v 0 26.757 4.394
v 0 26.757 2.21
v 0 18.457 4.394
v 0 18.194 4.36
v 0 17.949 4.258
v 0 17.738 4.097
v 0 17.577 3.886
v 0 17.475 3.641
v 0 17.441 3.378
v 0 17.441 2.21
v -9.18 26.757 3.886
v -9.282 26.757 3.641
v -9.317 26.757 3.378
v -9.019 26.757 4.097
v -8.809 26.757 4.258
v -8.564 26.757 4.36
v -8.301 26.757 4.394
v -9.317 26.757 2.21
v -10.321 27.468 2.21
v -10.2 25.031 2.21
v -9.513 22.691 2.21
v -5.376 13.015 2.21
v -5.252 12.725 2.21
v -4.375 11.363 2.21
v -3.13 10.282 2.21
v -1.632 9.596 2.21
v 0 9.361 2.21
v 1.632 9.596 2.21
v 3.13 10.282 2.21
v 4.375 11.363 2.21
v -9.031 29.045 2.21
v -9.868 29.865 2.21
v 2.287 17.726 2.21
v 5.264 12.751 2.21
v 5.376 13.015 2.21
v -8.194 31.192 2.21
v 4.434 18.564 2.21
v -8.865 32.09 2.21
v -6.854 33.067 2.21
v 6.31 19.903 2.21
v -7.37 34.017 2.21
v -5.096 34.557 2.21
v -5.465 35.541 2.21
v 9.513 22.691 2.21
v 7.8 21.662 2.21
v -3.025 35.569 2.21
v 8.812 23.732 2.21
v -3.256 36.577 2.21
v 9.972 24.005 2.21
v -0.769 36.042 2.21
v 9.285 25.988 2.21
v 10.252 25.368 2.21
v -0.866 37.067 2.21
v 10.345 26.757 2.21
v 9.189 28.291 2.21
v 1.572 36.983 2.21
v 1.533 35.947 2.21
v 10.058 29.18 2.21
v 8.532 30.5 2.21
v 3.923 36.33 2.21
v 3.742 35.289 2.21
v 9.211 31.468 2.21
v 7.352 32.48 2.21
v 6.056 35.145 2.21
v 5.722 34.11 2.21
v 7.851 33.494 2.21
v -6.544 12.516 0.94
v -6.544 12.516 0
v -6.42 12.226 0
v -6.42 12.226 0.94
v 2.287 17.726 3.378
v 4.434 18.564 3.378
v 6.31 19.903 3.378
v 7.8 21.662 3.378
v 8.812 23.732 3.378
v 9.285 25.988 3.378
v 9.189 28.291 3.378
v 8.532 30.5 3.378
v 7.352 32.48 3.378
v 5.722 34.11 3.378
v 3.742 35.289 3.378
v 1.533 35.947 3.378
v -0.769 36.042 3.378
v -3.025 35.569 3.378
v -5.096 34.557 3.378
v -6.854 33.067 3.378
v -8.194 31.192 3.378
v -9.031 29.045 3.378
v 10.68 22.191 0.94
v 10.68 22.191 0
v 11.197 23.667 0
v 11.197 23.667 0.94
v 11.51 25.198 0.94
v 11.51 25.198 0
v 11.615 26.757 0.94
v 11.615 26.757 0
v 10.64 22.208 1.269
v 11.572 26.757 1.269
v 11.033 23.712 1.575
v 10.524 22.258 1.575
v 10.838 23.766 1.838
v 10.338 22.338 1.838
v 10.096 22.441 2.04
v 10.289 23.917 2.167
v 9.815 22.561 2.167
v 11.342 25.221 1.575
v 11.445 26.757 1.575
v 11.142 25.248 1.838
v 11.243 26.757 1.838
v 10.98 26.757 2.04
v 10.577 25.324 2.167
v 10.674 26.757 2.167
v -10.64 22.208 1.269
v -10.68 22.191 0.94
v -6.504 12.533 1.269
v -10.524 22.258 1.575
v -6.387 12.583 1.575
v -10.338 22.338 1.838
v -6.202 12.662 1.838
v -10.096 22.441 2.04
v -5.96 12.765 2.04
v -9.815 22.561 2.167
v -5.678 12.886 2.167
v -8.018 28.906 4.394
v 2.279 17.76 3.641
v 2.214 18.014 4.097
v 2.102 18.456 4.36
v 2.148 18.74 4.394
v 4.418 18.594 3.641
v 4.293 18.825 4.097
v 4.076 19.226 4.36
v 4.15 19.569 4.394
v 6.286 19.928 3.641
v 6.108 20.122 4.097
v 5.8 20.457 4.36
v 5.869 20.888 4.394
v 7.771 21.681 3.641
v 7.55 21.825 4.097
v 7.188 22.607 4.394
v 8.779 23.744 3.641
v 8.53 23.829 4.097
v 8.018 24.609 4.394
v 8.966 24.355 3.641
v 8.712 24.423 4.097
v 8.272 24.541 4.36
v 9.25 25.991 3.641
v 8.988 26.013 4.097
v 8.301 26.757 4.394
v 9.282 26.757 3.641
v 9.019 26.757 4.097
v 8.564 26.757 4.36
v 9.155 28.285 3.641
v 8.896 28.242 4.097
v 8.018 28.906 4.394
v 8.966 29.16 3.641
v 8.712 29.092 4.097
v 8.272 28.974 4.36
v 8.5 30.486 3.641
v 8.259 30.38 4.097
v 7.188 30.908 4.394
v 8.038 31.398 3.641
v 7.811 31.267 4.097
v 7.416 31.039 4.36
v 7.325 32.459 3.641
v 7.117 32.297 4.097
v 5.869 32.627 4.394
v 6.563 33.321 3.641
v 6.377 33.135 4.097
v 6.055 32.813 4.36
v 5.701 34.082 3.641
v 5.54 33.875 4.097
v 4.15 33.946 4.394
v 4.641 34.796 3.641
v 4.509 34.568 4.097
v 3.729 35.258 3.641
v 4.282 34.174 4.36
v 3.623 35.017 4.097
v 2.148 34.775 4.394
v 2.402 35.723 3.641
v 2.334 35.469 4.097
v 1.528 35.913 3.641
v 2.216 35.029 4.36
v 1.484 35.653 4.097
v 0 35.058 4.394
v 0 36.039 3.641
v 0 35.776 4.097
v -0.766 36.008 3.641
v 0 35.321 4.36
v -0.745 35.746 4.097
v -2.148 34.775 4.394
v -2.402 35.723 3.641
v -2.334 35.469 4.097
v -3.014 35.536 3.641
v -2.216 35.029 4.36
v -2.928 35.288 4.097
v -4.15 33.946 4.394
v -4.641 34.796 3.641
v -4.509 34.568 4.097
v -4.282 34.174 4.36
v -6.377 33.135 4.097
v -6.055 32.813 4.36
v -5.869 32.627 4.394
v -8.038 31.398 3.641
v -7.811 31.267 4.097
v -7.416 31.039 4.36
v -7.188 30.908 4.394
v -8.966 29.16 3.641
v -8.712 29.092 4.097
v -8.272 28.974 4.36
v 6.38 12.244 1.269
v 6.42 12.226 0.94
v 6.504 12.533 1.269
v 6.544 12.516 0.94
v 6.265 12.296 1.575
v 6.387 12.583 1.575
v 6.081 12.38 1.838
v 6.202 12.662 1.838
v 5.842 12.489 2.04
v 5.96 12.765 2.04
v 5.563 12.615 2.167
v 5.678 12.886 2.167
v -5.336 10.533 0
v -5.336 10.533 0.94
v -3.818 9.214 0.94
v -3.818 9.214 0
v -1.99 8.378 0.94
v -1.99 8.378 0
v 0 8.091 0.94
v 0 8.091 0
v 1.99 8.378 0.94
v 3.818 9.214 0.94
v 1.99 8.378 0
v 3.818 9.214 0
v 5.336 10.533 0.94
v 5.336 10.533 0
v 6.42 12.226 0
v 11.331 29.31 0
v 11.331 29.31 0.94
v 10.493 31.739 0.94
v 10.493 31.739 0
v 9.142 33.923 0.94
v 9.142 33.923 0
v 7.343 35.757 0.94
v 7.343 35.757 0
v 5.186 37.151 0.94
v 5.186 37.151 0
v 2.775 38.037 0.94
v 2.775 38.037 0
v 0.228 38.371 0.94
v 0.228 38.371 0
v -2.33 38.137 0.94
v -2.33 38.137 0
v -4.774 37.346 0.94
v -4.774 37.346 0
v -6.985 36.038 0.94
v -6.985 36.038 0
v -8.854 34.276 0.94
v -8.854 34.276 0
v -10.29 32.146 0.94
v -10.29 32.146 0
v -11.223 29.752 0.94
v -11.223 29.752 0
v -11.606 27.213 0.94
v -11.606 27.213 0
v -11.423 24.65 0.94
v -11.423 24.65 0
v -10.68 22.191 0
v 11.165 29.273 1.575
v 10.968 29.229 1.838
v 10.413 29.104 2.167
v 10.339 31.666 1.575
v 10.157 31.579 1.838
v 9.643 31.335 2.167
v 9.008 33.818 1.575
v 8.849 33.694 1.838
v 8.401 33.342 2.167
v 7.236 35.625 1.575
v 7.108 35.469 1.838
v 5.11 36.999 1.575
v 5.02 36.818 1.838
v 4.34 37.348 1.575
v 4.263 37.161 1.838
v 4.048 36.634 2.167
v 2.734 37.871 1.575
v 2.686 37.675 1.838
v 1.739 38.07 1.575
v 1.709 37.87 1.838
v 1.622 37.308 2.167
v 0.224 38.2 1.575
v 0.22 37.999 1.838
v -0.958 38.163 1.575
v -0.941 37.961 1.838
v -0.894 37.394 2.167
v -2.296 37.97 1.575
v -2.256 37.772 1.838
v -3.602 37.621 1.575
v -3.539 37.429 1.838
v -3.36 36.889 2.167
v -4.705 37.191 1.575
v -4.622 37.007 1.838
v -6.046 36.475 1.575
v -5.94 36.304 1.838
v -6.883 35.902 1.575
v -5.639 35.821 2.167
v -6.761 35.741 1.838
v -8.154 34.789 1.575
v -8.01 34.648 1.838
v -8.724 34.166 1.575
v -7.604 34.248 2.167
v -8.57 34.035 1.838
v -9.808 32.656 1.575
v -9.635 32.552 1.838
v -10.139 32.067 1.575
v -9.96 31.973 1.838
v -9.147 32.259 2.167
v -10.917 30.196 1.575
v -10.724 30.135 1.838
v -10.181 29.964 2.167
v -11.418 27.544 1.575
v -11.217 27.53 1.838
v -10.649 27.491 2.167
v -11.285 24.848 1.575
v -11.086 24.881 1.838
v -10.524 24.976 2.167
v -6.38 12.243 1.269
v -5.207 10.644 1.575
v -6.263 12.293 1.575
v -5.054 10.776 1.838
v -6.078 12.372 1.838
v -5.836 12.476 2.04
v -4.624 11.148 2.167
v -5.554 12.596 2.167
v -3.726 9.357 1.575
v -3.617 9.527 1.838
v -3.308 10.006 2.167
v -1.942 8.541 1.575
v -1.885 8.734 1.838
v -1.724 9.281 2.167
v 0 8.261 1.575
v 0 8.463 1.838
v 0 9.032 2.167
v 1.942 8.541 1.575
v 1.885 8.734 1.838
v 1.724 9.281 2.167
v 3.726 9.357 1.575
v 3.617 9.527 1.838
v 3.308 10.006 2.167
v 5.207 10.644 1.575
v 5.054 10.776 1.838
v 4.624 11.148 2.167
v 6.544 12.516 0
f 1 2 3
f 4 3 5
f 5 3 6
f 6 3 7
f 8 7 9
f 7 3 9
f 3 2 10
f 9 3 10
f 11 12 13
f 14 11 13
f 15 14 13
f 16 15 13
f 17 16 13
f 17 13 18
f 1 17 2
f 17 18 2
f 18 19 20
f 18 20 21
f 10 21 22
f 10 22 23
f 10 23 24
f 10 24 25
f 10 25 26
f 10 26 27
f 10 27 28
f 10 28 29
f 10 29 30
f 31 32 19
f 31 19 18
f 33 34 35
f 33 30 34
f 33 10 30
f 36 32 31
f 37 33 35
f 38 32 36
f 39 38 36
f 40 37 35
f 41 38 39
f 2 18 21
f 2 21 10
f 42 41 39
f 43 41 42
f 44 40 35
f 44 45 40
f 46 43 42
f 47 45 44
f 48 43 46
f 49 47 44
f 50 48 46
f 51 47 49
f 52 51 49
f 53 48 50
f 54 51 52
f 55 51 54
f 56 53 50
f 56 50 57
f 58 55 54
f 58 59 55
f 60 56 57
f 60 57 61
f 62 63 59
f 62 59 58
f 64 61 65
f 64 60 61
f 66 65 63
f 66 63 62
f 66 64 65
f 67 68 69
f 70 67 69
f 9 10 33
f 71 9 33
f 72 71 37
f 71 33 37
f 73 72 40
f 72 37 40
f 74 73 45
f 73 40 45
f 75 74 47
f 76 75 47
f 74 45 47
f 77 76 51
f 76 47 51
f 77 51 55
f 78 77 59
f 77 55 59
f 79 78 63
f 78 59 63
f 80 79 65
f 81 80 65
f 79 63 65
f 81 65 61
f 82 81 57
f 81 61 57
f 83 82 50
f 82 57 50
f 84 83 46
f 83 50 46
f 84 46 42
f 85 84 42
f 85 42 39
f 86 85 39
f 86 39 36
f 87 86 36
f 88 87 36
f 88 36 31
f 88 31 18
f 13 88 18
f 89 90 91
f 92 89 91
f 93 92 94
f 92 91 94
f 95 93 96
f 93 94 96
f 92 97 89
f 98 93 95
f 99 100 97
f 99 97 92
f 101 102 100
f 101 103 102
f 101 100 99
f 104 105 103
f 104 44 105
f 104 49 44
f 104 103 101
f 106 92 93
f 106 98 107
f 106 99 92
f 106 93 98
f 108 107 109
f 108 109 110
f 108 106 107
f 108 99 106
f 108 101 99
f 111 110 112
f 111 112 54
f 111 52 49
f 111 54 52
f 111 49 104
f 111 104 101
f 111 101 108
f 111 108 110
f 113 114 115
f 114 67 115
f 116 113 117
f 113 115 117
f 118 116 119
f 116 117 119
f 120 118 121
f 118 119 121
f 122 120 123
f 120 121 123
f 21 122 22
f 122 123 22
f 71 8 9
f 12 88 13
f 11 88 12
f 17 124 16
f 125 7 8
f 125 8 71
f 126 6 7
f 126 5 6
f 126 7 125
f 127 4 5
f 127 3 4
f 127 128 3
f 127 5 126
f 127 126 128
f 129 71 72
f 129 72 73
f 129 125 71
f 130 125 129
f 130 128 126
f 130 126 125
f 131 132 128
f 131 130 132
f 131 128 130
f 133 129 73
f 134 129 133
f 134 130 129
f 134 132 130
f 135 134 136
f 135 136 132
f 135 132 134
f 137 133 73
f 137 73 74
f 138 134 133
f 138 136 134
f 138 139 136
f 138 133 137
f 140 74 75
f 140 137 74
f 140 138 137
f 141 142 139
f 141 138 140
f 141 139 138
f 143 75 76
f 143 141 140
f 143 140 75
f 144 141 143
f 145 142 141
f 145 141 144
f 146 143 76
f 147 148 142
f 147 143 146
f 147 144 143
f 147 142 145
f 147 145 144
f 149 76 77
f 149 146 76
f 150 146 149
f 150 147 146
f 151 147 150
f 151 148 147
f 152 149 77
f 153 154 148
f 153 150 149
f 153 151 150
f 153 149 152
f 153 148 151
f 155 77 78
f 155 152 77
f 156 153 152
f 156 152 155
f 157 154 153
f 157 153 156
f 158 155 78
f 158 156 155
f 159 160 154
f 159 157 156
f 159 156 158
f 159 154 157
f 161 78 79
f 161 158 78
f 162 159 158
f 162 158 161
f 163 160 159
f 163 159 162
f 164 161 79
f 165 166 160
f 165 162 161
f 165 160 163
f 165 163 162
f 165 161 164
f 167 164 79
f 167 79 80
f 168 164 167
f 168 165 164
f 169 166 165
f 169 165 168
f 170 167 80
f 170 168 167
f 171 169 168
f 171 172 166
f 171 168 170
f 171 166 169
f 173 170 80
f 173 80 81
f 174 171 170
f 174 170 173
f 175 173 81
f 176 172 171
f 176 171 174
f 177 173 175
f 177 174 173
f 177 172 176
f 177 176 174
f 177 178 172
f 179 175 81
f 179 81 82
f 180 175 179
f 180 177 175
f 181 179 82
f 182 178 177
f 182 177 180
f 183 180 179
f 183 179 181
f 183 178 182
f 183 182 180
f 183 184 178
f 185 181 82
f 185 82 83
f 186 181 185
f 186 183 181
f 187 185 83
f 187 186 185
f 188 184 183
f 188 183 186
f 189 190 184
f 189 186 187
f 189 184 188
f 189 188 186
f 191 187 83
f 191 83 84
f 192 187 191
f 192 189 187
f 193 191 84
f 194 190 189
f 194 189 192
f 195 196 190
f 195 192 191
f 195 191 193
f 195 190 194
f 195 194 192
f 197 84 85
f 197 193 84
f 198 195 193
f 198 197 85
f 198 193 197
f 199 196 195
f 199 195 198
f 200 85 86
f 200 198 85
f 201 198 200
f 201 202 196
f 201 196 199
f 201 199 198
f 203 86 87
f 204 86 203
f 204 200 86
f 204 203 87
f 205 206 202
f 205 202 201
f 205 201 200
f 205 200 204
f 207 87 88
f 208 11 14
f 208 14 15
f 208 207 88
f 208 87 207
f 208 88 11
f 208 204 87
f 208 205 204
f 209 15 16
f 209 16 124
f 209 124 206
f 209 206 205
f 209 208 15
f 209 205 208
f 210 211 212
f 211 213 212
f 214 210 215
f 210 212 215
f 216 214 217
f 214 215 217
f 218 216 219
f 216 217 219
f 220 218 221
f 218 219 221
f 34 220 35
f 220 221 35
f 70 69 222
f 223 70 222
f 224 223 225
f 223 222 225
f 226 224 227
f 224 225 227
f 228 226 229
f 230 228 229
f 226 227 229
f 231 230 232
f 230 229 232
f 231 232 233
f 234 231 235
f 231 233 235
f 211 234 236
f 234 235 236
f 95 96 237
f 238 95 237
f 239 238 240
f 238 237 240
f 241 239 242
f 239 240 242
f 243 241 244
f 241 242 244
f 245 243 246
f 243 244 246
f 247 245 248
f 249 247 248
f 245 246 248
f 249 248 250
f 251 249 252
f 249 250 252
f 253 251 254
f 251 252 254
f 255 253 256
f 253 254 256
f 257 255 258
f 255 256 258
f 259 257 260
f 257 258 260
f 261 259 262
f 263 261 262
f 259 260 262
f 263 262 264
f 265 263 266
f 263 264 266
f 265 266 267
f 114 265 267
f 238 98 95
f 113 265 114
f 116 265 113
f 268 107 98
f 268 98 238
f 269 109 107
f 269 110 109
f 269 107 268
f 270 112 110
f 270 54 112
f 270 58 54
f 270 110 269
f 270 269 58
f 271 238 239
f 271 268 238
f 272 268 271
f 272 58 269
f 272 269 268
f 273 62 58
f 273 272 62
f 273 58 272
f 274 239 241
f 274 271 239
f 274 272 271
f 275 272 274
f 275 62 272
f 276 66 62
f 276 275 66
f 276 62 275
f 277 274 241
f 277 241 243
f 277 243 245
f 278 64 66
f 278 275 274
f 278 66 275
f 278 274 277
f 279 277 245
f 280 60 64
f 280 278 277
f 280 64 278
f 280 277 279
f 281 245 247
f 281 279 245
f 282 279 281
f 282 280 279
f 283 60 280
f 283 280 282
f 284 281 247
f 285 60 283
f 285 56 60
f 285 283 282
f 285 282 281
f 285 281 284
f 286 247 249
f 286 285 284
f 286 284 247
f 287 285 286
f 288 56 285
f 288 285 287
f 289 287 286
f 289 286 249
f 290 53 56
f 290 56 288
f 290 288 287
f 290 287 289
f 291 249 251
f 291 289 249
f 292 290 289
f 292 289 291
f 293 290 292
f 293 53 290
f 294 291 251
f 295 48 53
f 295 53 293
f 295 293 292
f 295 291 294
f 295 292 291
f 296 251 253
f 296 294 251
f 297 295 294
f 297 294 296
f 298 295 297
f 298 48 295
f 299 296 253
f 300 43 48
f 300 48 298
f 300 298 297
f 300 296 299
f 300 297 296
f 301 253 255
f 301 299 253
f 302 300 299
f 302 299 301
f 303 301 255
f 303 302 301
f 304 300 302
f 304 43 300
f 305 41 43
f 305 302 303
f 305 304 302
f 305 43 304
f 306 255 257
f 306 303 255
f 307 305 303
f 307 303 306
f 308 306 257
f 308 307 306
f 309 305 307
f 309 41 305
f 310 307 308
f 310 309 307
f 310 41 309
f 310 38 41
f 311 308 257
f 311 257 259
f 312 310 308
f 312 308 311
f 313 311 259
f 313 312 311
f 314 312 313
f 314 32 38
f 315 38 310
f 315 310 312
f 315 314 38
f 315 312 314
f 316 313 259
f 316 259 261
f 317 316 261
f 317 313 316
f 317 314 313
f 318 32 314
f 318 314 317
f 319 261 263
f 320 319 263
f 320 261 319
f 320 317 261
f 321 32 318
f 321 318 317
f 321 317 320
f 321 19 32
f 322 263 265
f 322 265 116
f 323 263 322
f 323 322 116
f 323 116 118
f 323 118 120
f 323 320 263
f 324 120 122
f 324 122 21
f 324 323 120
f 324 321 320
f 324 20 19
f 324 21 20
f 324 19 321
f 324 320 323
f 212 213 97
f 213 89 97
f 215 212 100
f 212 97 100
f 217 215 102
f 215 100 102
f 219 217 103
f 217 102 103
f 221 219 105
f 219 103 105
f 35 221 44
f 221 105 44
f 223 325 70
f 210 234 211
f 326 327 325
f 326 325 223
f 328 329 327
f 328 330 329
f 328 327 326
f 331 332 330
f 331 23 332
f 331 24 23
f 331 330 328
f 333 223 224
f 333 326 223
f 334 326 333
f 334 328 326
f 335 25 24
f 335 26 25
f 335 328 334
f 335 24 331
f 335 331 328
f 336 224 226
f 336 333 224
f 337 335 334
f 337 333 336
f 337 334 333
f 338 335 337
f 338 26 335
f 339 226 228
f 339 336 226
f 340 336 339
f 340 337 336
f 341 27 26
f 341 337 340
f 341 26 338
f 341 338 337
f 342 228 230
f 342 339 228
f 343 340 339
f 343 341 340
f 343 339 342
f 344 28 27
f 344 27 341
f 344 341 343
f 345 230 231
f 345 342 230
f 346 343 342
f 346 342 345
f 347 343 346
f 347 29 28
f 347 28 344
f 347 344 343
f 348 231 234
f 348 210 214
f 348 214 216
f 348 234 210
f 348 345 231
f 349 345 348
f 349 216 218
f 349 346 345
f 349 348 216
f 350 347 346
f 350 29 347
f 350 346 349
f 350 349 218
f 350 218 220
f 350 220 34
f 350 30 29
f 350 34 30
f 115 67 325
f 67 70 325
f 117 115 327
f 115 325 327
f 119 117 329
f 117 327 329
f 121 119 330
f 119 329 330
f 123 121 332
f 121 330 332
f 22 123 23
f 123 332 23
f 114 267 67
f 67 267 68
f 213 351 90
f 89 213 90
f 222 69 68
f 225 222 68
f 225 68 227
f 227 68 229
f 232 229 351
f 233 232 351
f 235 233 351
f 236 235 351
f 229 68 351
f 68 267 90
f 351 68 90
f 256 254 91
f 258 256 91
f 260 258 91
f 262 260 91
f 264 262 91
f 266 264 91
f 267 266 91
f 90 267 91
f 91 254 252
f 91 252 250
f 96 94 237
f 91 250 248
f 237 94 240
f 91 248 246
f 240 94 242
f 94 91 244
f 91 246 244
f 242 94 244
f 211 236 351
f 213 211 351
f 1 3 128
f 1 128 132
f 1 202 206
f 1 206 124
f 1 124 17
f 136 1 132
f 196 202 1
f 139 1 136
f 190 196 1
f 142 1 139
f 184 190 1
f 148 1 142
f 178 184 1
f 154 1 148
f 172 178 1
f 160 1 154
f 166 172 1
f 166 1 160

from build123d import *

# Parameters (mm, degrees)
F1_DEPTH = 2.2098
F2_R     = 1.27
F4_DEPTH = 2.1844
F5_R     = 1.016


with BuildPart() as f1:
    # F0 (on Top) → F1 (new body)
    with BuildSketch(Plane.XY):
        with BuildLine():
            ThreePointArc((10.680274663, 22.1913547378), (11.3792147126, 24.4270132399), (11.6153963278, 26.7574433237))
            ThreePointArc((11.6153963278, 26.7574433237), (-2.3304300838, 38.1366580363), (-10.680274663, 22.1913547378))
            ThreePointArc((-10.680274663, 22.1913547378), (-9.0390071452, 19.4626656245), (-6.7184275333, 17.282203837))
            ThreePointArc((-6.7184275333, 17.282203837), (0, 22.1931135695), (6.7184275333, 17.282203837))
            ThreePointArc((6.7184275333, 17.282203837), (9.0390071452, 19.4626656245), (10.680274663, 22.1913547378))
        make_face()
        with BuildLine():
            ThreePointArc((6.7184275333, 17.282203837), (0, 22.1931135695), (-6.7184275333, 17.282203837))
            ThreePointArc((-6.7184275333, 17.282203837), (0, 15.142046996), (6.7184275333, 17.282203837))
        make_face()
        with BuildLine():
            ThreePointArc((6.7184275333, 17.282203837), (0, 15.142046996), (-6.7184275333, 17.282203837))
            ThreePointArc((-6.7184275333, 17.282203837), (-7.0463335637, 14.8837387803), (-6.5436952619, 12.5157202562))
            Line((-6.5436952619, 12.5157202562), (-6.4198818287, 12.2261153899))
            Line((-6.4198818287, 12.2261153899), (6.4198818287, 12.2261153899))
            Line((6.4198818287, 12.2261153899), (6.5436952619, 12.5157202562))
            ThreePointArc((6.5436952619, 12.5157202562), (6.9230618499, 13.8046037456), (7.0510665736, 15.142046996))
            ThreePointArc((7.0510665736, 15.142046996), (6.9674105531, 16.2249735904), (6.7184275333, 17.282203837))
        make_face()
        with BuildLine():
            ThreePointArc((-6.7184275333, 17.282203837), (-9.0390071452, 19.4626656245), (-10.680274663, 22.1913547378))
            Line((-10.680274663, 22.1913547378), (-6.5436952619, 12.5157202562))
            ThreePointArc((-6.5436952619, 12.5157202562), (-7.0463335637, 14.8837387803), (-6.7184275333, 17.282203837))
        make_face()
        with BuildLine():
            Line((6.4198818287, 12.2261153899), (-6.4198818287, 12.2261153899))
            ThreePointArc((-6.4198818287, 12.2261153899), (0, 8.0909804224), (6.4198818287, 12.2261153899))
        make_face()
        with BuildLine():
            Line((6.5436952619, 12.5157202562), (10.680274663, 22.1913547378))
            ThreePointArc((10.680274663, 22.1913547378), (9.0390071452, 19.4626656245), (6.7184275333, 17.282203837))
            ThreePointArc((6.7184275333, 17.282203837), (6.9674105531, 16.2249735904), (7.0510665736, 15.142046996))
            ThreePointArc((7.0510665736, 15.142046996), (6.9230618499, 13.8046037456), (6.5436952619, 12.5157202562))
        make_face()
    extrude(amount=F1_DEPTH)

    # F2
    f2_edges = [f1.edges().sort_by_distance(p)[0] for p in [
        (8.550078, 17.208735, 2.2098),
        (0, 38.37284, 2.2098),
        (-8.550078, 17.208735, 2.2098),
        (0, 8.09098, 2.2098),
    ]]
    fillet(f2_edges, radius=F2_R)

    # F3 (on face) → F4 (join)
    with BuildSketch(Plane.XY.offset(2.2098)):
        with BuildLine():
            Line((0, 26.7574433237), (0, 36.074007986))
            ThreePointArc((0, 36.074007986), (-6.5878060501, 33.3452493738), (-9.3165646623, 26.7574433237))
            Line((-9.3165646623, 26.7574433237), (0, 26.7574433237))
        make_face()
        with BuildLine():
            ThreePointArc((9.3165646623, 26.7574433237), (6.5878060501, 33.3452493738), (0, 36.074007986))
            Line((0, 36.074007986), (0, 26.7574433237))
            Line((0, 26.7574433237), (0, 17.4408786614))
            ThreePointArc((0, 17.4408786614), (6.5878060501, 20.1696372737), (9.3165646623, 26.7574433237))
        make_face()
    extrude(amount=F4_DEPTH)

    # F5
    f5_edges = [f1.edges().sort_by_distance(p)[0] for p in [
        (6.587806, 33.345249, 4.3942),
    ]]
    fillet(f5_edges, radius=F5_R)


solid = f1.part
